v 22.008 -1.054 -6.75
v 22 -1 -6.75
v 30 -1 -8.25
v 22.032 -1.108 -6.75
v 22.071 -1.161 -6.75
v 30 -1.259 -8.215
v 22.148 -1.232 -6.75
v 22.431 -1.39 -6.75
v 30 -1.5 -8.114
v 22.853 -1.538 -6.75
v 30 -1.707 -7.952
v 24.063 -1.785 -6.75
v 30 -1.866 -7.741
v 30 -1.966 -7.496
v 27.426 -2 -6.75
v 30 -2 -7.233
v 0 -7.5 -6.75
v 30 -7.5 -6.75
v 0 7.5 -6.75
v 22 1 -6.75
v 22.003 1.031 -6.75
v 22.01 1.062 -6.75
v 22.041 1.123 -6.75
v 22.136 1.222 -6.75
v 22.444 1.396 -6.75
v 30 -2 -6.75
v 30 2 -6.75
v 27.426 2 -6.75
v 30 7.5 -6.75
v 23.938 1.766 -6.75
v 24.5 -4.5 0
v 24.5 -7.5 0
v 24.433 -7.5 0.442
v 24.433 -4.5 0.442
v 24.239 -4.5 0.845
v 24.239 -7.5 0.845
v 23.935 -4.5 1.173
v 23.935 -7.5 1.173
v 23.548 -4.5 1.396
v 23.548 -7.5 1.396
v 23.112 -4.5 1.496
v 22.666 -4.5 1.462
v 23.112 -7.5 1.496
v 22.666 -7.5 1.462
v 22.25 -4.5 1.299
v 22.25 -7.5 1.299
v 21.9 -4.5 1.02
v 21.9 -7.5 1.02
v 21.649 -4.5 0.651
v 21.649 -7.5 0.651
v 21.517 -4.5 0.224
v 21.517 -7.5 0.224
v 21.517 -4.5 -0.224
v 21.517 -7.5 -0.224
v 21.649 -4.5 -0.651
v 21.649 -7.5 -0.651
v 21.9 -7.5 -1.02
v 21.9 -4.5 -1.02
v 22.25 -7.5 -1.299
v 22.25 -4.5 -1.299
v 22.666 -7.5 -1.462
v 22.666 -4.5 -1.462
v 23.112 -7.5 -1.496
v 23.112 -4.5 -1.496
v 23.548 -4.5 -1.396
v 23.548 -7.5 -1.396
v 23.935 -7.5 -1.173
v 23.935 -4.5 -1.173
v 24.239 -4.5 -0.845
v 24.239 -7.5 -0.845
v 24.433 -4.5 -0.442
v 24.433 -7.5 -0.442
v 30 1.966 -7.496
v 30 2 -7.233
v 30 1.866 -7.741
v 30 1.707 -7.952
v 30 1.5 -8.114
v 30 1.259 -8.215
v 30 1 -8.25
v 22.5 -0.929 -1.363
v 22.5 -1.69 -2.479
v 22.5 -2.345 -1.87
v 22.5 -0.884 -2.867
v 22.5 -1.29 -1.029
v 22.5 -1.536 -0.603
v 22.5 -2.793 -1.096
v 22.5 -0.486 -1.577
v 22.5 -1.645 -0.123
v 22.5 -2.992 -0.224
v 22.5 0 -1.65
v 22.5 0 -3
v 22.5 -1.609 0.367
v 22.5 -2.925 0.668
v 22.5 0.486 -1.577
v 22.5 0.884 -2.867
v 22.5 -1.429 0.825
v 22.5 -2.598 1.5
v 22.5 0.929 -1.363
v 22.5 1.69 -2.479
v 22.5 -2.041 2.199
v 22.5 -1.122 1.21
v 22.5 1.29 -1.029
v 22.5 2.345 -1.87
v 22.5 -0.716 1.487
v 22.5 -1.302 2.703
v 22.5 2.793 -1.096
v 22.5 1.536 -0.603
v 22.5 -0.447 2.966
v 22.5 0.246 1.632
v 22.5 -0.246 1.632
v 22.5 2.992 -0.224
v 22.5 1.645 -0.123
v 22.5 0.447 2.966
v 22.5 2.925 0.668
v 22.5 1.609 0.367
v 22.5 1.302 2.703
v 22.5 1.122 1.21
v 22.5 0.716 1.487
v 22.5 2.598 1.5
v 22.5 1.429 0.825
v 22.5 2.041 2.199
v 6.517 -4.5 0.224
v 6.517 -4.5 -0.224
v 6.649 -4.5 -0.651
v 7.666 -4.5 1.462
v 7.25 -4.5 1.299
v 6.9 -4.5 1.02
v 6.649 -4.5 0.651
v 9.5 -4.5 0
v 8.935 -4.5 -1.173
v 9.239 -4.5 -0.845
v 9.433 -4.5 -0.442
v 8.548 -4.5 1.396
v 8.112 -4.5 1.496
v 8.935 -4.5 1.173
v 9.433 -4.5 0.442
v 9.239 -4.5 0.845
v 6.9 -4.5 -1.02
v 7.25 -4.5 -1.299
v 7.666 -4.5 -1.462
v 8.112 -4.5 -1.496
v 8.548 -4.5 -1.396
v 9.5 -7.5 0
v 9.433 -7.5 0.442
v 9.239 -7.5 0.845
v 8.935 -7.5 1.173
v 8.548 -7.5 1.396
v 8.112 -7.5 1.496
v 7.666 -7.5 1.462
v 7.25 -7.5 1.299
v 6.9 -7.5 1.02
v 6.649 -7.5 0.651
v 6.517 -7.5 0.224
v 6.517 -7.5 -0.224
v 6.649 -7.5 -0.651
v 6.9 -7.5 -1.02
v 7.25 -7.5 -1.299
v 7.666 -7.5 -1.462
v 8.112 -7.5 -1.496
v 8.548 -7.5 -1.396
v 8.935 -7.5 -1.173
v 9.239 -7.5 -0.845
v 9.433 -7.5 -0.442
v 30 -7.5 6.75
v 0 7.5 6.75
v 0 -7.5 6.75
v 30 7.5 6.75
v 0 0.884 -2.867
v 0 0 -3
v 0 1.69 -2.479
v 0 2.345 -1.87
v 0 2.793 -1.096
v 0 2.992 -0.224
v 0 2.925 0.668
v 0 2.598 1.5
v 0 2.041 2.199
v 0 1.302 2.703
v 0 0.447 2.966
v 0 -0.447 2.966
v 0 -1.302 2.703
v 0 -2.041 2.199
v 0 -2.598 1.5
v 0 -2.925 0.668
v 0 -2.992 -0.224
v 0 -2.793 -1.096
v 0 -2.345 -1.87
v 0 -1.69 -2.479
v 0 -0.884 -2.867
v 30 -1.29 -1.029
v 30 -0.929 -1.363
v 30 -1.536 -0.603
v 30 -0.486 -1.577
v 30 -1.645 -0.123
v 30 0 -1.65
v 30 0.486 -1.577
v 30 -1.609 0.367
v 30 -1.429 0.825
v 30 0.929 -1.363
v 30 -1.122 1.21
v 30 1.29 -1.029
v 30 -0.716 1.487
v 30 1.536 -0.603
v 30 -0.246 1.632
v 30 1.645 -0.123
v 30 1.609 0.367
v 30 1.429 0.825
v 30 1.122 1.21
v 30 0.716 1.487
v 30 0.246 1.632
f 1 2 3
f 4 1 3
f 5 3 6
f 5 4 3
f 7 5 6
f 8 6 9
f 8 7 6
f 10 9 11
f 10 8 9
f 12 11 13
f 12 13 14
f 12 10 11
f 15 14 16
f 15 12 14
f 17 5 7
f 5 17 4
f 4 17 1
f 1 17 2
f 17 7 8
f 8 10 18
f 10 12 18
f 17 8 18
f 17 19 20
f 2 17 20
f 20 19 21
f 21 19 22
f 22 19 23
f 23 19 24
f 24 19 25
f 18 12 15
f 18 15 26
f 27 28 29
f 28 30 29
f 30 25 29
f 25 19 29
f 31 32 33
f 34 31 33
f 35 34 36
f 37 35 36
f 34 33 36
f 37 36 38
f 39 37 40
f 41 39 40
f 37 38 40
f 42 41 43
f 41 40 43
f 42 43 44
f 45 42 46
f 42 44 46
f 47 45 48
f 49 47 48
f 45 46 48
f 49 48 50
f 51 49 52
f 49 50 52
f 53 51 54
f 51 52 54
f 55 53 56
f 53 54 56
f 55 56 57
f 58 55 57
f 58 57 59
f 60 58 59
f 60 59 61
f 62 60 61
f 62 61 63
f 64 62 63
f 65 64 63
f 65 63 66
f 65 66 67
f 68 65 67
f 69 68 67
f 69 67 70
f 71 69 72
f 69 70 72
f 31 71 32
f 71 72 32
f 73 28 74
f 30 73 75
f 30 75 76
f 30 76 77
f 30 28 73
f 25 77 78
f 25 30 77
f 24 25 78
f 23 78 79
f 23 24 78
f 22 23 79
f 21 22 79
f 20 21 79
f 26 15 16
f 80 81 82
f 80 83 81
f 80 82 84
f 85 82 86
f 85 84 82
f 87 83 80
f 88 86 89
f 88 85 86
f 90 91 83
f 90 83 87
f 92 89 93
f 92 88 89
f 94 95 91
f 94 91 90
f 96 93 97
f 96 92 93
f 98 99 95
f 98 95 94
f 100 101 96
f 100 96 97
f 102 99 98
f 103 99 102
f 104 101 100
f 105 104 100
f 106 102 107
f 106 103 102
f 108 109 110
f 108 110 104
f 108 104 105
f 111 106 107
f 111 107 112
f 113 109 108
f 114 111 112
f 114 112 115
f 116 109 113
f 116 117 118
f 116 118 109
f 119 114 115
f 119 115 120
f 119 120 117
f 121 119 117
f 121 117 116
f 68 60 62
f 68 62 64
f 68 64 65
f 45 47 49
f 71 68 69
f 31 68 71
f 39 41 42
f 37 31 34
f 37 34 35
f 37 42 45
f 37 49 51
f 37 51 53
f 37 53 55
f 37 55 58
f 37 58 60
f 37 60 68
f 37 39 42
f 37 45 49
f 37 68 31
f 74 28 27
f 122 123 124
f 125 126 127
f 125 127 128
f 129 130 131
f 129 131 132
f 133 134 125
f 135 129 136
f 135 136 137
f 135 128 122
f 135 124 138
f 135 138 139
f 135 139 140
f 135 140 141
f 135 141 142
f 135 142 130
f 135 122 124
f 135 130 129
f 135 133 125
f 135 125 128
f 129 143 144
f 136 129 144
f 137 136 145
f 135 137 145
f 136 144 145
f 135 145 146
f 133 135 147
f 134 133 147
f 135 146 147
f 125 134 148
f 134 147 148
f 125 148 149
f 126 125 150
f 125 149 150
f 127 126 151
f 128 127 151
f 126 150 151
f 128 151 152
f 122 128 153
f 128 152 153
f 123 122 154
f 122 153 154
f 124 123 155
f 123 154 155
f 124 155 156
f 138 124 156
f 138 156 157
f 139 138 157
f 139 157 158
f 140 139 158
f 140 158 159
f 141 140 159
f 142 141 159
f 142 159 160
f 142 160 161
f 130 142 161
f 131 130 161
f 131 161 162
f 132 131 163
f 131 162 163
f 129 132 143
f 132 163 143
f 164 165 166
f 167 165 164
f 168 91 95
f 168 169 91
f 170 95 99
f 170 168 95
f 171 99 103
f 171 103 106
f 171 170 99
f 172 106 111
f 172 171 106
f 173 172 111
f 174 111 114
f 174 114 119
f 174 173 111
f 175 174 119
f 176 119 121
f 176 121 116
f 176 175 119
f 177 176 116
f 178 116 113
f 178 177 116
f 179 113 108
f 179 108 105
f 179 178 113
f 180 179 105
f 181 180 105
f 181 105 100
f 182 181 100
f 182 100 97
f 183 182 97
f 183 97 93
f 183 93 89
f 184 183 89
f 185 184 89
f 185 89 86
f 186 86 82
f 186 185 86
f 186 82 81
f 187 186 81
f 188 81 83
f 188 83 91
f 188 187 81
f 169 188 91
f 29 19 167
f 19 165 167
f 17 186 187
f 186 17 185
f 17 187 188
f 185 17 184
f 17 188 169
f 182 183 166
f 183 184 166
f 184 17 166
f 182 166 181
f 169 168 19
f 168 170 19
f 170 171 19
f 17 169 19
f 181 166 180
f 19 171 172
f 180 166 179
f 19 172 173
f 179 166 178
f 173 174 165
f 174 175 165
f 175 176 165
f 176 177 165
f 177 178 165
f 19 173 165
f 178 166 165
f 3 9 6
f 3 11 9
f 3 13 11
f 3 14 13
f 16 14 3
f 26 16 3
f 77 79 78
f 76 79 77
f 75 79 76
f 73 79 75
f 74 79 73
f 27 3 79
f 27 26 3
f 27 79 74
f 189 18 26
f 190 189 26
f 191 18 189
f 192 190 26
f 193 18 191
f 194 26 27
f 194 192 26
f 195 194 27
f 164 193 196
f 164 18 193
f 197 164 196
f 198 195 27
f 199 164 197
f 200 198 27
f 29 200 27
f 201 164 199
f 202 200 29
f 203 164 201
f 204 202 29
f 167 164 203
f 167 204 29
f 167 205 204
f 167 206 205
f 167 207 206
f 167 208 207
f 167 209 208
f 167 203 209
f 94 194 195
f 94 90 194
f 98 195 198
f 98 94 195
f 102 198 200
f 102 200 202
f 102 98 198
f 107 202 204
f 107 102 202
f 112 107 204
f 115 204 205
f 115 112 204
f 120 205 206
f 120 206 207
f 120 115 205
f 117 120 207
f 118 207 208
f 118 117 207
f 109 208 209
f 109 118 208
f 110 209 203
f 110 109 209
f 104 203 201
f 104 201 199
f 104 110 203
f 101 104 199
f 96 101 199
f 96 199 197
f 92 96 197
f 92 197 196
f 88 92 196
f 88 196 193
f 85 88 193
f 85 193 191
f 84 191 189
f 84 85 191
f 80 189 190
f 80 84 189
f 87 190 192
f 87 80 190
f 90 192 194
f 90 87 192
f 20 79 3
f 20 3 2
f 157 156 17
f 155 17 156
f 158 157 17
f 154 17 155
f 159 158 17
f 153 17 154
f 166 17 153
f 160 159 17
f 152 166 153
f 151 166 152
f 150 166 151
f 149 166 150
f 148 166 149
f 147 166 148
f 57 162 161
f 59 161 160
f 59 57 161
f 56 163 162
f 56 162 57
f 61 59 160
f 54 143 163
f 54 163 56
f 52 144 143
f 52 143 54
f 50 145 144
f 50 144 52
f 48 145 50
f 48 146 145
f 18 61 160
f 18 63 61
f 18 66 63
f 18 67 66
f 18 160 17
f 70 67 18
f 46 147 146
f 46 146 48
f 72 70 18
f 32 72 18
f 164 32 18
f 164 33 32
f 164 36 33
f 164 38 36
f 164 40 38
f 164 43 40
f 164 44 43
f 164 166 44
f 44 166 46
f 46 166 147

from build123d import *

# Parameters (mm, degrees)
SKETCH1_W           = 30
SKETCH1_H           = 15
BOSS_EXTRUDE1_DEPTH = 6.75
SKETCH3_R           = 1.5
CUT_EXTRUDE1_DEPTH  = 3
BOSS_EXTRUDE2_DEPTH = 2
FILLET1_R           = 1


with BuildPart() as part:
    # Sketch1 → Boss-Extrude1 (new body, symmetric)
    with BuildSketch(Plane.XY):
        with Locations((15, 0)):
            Rectangle(SKETCH1_W, SKETCH1_H)
    extrude(amount=BOSS_EXTRUDE1_DEPTH, both=True)

    # Sketch3 → Cut-Extrude1 (cut)
    with BuildSketch(Plane.XZ.offset(7.5)):
        with Locations((8, 0)):
            Circle(SKETCH3_R)
        with Locations((23, 0)):
            Circle(SKETCH3_R)
    extrude(amount=-CUT_EXTRUDE1_DEPTH, mode=Mode.SUBTRACT)

    # Sketch4 → Boss-Extrude2 (add, symmetric)
    with BuildSketch(Plane(origin=(0, 0, 0), x_dir=(1, 0, 0), z_dir=(0, 1, 0))):
        Polygon((30, 6.75), (30, 8.25), (22, 6.75), align=None)
    extrude(amount=BOSS_EXTRUDE2_DEPTH, both=True)

    # Fillet1
    fillet1_edges = [part.edges().sort_by_distance(p)[0] for p in [
        (26, -2, -7.5),
        (26, 2, -7.5),
    ]]
    fillet(fillet1_edges, radius=FILLET1_R)

    # Sketch2 → Cut-Revolve1 (revolve, cut)
    with BuildSketch(Plane(origin=(0, 0, 0), x_dir=(1, 0, 0), z_dir=(0, 1, 0))):
        Polygon((0, 0), (30, 0), (30, 1.65), (22.5, 1.65), (22.5, 3), (0, 3), align=None)
    revolve(axis=Axis((0, 0, 0), (1, 0, 0)), mode=Mode.SUBTRACT)


solid = part.part
